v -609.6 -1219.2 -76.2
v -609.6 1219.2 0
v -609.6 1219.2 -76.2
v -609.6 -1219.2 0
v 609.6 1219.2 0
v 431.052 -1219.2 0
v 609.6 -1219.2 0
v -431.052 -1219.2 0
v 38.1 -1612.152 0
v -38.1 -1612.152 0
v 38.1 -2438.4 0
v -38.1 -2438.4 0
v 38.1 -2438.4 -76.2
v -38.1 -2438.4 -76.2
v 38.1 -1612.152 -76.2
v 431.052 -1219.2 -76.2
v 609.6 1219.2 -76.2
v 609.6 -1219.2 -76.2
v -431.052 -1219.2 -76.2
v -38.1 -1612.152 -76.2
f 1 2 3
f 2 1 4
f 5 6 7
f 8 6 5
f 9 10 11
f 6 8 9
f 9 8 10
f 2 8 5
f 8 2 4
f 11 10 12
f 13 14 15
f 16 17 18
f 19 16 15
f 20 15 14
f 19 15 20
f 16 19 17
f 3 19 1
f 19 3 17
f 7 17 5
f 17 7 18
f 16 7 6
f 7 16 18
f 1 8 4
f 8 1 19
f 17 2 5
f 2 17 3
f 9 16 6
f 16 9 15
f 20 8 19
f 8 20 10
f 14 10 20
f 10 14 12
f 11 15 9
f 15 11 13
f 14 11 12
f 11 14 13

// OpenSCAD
// file: ../lib/colors.scad
module color_wood() {
  color("#F8D89D")
    children();
}

module color_hdpe() {
  color("#ccd")
    children();
}

module color_steel() {
  color("#888")
    children();
}

module color_white() {
  color("#fafafa")
    children();
}

module color_black() {
  color("#333")
    children();
}

module color_bed_liner() {
  color("#aaa")
    children();
}
// file: ../lib/convert.scad
function inches(in) = in * 25.4;
function feet(ft) = inches(ft * 12);
// main file
use <../lib/convert.scad>
use <../lib/colors.scad>

frame_width = feet(4);
frame_length = feet(8);
frame_thickness = inches(3);

module teardrop_frame() {
  translate([0, 0, -frame_thickness / 2])
  color_black()
  rotate([0, 0, 180])
  union() {
    cube([frame_width, frame_length, frame_thickness], center = true);

    translate([0, frame_length / 2, 0])
    rotate([0, 0, 45])
      cube([feet(2), feet(2), frame_thickness], center = true);

    translate([0, frame_length / 2, 0])
      cube([inches(3), frame_length, frame_thickness], center = true);
  }
}

teardrop_frame();
